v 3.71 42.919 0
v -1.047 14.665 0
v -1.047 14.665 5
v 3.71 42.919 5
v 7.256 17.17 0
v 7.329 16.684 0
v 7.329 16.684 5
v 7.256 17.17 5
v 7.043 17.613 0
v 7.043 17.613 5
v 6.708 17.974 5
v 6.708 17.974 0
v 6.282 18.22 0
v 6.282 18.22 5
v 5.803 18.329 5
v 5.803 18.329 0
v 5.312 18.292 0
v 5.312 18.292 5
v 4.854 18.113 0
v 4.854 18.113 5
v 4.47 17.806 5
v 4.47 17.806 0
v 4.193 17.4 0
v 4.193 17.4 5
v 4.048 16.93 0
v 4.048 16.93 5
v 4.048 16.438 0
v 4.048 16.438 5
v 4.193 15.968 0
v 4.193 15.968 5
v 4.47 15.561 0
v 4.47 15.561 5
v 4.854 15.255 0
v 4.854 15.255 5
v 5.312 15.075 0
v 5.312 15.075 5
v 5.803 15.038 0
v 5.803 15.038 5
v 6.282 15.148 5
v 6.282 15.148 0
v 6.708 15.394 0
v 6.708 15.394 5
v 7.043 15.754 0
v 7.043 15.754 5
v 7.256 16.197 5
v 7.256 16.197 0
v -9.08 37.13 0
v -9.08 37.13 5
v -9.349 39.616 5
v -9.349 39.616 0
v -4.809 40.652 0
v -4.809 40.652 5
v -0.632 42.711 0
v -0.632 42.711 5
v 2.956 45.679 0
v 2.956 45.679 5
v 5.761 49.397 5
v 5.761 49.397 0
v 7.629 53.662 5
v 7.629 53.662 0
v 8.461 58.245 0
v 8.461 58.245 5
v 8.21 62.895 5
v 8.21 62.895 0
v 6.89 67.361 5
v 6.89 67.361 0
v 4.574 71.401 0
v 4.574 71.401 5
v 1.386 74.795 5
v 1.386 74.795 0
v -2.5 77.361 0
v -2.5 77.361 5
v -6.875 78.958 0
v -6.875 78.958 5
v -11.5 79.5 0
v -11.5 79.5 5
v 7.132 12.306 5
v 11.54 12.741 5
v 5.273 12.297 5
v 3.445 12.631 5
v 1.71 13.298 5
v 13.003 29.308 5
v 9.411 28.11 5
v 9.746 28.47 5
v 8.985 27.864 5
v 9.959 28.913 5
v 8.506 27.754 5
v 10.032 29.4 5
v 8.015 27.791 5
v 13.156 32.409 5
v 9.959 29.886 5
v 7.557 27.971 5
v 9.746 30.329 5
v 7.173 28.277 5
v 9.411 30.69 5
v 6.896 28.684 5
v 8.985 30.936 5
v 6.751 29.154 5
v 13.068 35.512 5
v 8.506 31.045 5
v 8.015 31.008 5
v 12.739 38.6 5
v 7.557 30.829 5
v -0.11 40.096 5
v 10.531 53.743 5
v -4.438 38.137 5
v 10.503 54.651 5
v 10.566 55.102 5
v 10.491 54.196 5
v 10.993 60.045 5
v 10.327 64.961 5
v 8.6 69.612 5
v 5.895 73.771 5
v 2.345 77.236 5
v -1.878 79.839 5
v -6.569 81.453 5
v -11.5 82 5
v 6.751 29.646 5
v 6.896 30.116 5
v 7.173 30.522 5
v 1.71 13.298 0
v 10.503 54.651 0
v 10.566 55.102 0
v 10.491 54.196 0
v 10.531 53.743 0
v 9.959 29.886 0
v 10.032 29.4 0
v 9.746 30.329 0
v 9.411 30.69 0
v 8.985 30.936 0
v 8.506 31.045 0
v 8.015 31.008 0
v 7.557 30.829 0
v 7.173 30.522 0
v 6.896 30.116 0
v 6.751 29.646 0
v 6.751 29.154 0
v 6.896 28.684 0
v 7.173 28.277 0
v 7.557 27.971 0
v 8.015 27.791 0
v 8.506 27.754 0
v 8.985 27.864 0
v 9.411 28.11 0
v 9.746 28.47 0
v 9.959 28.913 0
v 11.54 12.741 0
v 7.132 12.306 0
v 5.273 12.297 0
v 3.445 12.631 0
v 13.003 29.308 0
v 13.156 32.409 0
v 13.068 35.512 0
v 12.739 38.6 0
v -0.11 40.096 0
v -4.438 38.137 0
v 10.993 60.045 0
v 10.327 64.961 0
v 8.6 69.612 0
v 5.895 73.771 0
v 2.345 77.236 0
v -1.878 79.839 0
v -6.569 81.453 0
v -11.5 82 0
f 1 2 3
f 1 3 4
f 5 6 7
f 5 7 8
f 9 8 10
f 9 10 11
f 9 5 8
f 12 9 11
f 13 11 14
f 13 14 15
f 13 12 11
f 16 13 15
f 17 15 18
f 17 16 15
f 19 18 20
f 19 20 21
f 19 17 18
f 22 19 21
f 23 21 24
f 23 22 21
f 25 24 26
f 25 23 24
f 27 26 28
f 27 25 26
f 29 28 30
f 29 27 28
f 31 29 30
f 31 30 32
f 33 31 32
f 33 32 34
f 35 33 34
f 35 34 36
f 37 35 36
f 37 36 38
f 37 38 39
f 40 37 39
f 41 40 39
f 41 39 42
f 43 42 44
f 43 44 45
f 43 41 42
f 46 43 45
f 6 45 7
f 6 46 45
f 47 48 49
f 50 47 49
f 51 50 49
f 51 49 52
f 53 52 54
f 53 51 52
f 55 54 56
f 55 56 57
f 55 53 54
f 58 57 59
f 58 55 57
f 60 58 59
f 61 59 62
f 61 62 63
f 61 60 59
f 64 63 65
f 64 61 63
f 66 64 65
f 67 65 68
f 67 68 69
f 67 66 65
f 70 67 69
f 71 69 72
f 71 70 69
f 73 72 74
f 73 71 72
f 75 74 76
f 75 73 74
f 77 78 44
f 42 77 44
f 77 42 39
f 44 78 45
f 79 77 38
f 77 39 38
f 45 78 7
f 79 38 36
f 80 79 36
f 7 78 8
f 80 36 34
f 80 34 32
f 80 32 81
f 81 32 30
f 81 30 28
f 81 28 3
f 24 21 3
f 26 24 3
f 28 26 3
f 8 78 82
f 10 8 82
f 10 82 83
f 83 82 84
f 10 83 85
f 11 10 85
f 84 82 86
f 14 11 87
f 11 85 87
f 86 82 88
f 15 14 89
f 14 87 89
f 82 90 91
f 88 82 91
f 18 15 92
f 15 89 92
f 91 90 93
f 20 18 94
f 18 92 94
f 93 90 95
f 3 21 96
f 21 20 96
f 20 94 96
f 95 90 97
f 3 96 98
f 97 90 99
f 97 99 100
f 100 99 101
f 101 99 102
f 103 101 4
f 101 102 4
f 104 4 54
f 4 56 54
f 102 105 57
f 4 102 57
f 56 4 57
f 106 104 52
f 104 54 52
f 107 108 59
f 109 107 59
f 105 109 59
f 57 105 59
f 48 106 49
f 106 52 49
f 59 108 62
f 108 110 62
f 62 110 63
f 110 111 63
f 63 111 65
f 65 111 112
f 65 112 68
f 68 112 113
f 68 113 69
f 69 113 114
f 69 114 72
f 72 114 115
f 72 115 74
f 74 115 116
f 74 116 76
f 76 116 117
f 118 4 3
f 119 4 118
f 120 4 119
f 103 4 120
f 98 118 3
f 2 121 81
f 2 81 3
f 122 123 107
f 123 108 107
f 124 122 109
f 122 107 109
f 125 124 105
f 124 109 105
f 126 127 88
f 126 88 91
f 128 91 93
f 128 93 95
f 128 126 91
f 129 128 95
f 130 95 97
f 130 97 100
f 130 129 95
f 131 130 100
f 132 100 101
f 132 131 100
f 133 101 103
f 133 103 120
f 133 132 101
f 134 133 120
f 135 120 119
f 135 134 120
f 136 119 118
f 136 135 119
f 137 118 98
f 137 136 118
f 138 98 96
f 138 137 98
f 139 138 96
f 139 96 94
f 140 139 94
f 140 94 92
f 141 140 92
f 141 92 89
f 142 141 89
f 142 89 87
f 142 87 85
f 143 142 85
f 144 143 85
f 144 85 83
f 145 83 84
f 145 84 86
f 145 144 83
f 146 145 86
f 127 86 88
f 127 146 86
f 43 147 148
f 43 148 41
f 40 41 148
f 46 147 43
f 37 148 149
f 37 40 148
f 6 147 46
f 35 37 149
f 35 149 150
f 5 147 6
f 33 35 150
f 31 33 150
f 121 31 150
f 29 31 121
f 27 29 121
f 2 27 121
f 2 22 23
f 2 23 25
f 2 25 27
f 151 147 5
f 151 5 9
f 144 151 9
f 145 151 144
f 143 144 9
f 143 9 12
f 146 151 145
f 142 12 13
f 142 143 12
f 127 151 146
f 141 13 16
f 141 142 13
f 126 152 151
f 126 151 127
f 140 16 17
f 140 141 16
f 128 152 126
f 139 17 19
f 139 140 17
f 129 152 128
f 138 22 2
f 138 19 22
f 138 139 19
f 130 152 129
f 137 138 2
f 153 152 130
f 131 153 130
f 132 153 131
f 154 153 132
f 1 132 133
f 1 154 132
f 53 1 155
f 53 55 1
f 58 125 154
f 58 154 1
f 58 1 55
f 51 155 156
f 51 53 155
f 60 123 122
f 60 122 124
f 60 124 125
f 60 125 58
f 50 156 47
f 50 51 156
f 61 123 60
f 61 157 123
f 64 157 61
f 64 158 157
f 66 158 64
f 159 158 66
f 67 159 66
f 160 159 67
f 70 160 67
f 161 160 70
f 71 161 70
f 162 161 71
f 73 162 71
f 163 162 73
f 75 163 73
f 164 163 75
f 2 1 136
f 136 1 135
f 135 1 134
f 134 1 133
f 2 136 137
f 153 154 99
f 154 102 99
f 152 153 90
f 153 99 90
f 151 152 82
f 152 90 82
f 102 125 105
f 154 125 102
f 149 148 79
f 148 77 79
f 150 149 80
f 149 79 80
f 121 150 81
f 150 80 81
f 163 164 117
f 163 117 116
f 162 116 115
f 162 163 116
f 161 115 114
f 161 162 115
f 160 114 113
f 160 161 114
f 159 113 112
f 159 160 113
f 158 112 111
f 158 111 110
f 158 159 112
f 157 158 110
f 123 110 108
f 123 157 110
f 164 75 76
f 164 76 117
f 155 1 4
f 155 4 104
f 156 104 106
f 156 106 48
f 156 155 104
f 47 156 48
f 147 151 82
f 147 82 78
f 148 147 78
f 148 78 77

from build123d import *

# Parameters (mm, degrees)
SKETCH_1_R      = 1.65
EXTRUDE_1_DEPTH = 5
FILLET_2_R      = 4
FILLET_3_R      = 40
FILLET_4_R      = 10


with BuildPart() as part:
    # 草图1 → 凸台-拉伸1 (new body)
    with BuildSketch(Plane.XY):
        with BuildLine():
            Line((-11.5, 79.5), (-11.5, 82))
            ThreePointArc((-11.5, 82), (6.103622298, 73.512939805), (10.426977744, 54.454442843))
            Line((10.426977744, 54.454442843), (13.41461423, 33.96926032))
            Line((13.41461423, 33.96926032), (11.539893904, 12.741041785))
            Line((11.539893904, 12.741041785), (4.278741136, 12.025251419))
            Line((4.278741136, 12.025251419), (-1.047111461, 14.664575003))
            Line((-1.047111461, 14.664575003), (3.709660575, 42.919402146))
            ThreePointArc((3.709660575, 42.919402146), (-2.22232543, 39.001835337), (-9.080443962, 37.130472768))
            Line((-9.080443962, 37.130472768), (-9.349283522, 39.615975794))
            ThreePointArc((-9.349283522, 39.615975794), (8.470985005, 60.576920581), (-11.5, 79.5))
        make_face()
        with Locations((5.679475492, 16.683750627)):
            Circle(SKETCH_1_R, mode=Mode.SUBTRACT)
        with Locations((8.382327473, 29.399669437)):
            Circle(SKETCH_1_R, mode=Mode.SUBTRACT)
    extrude(amount=EXTRUDE_1_DEPTH)

    # 圆角2
    fillet_2_edges = [part.edges().sort_by_distance(p)[0] for p in [
        (10.426977744, 54.454442843, 2.5),
    ]]
    fillet(fillet_2_edges, radius=FILLET_2_R)

    # 圆角3
    fillet_3_edges = [part.edges().sort_by_distance(p)[0] for p in [
        (13.41461423, 33.96926032, 2.5),
    ]]
    fillet(fillet_3_edges, radius=FILLET_3_R)

    # 圆角4
    fillet_4_edges = [part.edges().sort_by_distance(p)[0] for p in [
        (4.278741136, 12.025251419, 2.5),
    ]]
    fillet(fillet_4_edges, radius=FILLET_4_R)


solid = part.part
